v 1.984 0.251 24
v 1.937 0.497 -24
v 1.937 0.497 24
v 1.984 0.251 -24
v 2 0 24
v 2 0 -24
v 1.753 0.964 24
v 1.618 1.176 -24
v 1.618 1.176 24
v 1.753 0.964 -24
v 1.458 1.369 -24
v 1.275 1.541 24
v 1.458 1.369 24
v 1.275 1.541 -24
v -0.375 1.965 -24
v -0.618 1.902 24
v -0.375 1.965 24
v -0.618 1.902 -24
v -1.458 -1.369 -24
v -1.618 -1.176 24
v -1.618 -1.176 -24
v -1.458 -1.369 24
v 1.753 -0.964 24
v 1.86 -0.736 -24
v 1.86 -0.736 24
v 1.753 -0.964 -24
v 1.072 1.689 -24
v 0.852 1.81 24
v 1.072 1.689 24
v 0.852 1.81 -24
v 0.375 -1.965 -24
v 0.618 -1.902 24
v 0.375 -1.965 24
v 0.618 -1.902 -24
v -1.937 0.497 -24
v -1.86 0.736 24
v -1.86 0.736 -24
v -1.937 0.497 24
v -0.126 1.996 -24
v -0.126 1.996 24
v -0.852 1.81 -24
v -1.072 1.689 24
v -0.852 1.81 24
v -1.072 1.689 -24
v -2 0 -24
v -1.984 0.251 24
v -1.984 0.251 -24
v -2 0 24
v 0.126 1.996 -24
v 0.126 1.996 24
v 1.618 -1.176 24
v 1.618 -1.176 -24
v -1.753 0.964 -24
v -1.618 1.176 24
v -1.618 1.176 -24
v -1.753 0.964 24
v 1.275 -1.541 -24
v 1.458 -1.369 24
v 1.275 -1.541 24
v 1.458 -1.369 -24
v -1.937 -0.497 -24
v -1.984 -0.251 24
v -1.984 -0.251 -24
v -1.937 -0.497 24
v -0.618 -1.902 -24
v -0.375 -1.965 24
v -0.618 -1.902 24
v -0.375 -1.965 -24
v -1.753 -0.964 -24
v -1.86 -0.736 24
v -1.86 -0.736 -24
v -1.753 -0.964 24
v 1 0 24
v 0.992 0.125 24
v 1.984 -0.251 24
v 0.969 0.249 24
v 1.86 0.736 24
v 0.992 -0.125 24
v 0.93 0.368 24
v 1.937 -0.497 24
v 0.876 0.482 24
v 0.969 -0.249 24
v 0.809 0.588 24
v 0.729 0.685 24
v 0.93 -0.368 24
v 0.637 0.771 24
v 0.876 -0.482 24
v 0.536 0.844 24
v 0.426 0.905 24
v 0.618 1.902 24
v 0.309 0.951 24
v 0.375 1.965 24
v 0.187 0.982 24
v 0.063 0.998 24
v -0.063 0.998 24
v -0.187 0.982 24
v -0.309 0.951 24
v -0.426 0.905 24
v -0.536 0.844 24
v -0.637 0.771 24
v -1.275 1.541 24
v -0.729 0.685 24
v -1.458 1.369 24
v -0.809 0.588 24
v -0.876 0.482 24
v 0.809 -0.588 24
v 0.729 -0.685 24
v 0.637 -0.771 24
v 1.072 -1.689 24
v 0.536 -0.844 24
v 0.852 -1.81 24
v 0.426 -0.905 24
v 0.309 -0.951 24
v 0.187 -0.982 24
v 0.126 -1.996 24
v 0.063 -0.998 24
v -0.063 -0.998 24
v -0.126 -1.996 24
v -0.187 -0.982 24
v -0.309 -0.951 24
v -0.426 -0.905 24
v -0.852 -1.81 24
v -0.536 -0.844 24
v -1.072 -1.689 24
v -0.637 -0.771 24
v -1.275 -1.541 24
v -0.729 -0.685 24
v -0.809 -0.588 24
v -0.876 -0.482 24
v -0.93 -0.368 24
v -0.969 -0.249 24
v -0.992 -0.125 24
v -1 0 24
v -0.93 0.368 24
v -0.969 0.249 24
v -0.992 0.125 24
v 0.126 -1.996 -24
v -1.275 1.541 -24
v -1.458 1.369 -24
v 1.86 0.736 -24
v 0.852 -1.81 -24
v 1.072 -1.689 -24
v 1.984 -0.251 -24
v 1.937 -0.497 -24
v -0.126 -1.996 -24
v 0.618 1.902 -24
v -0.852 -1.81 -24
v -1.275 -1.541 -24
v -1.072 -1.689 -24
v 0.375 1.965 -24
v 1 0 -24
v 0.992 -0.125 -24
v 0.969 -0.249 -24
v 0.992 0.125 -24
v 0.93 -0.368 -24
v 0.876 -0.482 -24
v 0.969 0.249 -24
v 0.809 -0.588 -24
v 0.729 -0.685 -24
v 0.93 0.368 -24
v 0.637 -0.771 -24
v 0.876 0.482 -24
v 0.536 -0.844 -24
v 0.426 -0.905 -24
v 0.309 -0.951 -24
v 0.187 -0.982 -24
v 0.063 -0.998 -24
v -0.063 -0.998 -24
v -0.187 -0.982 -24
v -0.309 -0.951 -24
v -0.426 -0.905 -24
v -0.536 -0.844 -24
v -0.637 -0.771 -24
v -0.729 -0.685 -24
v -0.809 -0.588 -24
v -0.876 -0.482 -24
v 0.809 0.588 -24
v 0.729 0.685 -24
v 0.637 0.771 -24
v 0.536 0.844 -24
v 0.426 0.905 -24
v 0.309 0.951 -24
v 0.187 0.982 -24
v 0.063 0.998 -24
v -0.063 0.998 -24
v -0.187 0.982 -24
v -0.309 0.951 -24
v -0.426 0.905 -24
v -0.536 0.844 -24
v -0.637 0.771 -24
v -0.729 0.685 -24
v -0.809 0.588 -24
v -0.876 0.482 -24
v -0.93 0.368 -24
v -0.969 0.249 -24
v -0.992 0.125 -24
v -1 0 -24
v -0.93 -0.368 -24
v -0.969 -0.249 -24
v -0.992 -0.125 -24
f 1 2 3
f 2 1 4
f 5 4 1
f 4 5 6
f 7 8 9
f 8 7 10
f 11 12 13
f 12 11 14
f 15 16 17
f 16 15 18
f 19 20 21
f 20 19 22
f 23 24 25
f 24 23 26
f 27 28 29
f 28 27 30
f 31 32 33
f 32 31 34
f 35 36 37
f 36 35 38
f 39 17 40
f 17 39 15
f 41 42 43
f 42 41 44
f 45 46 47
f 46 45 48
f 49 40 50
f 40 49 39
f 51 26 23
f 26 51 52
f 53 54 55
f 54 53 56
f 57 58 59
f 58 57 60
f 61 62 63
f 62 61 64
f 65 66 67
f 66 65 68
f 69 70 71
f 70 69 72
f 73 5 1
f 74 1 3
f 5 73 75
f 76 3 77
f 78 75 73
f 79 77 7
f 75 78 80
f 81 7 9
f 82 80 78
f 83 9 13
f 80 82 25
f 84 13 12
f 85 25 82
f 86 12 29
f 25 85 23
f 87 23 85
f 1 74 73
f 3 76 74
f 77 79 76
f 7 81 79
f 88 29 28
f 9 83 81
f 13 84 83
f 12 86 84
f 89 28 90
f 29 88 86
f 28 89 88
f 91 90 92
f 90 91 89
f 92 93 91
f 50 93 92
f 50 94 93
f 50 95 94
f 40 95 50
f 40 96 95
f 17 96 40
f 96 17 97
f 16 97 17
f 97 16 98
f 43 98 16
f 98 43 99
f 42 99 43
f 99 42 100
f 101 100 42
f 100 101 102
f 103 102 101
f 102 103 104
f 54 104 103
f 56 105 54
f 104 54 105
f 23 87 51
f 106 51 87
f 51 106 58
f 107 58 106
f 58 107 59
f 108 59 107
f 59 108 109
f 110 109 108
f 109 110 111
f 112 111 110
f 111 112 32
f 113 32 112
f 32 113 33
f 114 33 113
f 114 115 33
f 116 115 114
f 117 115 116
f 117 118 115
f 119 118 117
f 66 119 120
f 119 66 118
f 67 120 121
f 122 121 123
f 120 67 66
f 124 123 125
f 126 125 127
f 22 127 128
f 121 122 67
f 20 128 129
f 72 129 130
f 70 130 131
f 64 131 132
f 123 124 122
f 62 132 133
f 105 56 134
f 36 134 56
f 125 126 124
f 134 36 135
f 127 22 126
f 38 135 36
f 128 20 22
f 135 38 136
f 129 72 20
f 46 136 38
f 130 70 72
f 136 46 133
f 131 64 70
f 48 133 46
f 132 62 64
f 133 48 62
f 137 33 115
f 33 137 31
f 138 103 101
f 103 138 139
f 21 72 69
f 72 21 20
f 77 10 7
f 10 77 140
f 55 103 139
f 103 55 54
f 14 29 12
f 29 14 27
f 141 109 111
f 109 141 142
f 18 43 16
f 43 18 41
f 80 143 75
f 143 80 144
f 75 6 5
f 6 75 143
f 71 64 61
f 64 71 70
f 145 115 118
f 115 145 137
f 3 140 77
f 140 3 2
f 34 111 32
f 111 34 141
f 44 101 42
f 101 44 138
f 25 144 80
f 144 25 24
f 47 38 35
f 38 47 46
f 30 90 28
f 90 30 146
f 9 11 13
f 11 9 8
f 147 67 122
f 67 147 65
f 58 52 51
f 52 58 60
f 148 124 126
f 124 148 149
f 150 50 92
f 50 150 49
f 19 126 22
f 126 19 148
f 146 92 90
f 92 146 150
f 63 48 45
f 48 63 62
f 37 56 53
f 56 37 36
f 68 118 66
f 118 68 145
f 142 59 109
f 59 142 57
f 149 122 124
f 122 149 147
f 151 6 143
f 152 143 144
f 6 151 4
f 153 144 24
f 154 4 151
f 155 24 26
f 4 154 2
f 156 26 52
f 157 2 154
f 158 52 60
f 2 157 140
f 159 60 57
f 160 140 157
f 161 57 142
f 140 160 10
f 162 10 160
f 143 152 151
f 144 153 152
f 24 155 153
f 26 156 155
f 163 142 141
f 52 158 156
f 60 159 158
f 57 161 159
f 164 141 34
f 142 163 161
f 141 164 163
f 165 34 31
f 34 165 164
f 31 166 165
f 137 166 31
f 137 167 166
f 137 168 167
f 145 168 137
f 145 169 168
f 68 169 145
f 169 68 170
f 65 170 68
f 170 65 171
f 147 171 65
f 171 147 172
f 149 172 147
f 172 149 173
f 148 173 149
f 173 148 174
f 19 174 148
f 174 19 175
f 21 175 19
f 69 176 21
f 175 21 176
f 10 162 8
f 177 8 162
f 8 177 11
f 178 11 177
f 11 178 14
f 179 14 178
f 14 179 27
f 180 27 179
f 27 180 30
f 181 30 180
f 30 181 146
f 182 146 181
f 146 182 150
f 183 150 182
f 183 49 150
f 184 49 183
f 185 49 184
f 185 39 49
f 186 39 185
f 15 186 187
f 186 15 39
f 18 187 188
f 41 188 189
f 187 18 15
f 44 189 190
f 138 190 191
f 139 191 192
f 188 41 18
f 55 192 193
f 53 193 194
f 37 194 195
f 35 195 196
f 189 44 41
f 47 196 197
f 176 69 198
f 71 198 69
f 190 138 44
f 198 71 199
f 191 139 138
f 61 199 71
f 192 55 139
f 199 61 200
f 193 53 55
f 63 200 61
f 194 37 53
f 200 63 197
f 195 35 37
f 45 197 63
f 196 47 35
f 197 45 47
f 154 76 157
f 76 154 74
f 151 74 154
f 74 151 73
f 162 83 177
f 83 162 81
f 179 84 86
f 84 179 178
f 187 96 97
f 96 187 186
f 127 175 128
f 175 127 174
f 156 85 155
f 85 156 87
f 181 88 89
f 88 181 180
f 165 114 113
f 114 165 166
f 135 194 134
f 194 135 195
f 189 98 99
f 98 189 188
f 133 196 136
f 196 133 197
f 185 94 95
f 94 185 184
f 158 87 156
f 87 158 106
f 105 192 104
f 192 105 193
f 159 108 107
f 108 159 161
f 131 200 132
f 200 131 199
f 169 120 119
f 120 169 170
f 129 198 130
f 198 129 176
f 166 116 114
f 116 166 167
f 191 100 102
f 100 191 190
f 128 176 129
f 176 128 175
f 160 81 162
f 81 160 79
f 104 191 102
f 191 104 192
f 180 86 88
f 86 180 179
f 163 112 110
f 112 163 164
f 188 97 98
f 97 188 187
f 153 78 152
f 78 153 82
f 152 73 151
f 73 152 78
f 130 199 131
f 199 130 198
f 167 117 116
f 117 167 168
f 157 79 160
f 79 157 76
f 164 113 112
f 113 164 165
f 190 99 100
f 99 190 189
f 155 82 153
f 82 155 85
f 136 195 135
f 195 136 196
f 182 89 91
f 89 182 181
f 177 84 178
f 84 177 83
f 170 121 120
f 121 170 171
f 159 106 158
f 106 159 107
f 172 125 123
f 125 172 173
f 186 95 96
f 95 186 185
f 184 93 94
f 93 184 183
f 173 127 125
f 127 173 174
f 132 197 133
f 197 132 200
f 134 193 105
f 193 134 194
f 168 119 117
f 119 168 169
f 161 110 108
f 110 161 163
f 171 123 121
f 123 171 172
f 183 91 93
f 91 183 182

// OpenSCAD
$fn = 50;


difference() {
	union() {
		translate(v = [0, 0, -24.0000000000]) {
			cylinder(h = 48, r = 2.0000000000);
		}
	}
	union() {
		translate(v = [0, 0, -100.0000000000]) {
			cylinder(h = 200, r = 1.0000000000);
		}
	}
}
